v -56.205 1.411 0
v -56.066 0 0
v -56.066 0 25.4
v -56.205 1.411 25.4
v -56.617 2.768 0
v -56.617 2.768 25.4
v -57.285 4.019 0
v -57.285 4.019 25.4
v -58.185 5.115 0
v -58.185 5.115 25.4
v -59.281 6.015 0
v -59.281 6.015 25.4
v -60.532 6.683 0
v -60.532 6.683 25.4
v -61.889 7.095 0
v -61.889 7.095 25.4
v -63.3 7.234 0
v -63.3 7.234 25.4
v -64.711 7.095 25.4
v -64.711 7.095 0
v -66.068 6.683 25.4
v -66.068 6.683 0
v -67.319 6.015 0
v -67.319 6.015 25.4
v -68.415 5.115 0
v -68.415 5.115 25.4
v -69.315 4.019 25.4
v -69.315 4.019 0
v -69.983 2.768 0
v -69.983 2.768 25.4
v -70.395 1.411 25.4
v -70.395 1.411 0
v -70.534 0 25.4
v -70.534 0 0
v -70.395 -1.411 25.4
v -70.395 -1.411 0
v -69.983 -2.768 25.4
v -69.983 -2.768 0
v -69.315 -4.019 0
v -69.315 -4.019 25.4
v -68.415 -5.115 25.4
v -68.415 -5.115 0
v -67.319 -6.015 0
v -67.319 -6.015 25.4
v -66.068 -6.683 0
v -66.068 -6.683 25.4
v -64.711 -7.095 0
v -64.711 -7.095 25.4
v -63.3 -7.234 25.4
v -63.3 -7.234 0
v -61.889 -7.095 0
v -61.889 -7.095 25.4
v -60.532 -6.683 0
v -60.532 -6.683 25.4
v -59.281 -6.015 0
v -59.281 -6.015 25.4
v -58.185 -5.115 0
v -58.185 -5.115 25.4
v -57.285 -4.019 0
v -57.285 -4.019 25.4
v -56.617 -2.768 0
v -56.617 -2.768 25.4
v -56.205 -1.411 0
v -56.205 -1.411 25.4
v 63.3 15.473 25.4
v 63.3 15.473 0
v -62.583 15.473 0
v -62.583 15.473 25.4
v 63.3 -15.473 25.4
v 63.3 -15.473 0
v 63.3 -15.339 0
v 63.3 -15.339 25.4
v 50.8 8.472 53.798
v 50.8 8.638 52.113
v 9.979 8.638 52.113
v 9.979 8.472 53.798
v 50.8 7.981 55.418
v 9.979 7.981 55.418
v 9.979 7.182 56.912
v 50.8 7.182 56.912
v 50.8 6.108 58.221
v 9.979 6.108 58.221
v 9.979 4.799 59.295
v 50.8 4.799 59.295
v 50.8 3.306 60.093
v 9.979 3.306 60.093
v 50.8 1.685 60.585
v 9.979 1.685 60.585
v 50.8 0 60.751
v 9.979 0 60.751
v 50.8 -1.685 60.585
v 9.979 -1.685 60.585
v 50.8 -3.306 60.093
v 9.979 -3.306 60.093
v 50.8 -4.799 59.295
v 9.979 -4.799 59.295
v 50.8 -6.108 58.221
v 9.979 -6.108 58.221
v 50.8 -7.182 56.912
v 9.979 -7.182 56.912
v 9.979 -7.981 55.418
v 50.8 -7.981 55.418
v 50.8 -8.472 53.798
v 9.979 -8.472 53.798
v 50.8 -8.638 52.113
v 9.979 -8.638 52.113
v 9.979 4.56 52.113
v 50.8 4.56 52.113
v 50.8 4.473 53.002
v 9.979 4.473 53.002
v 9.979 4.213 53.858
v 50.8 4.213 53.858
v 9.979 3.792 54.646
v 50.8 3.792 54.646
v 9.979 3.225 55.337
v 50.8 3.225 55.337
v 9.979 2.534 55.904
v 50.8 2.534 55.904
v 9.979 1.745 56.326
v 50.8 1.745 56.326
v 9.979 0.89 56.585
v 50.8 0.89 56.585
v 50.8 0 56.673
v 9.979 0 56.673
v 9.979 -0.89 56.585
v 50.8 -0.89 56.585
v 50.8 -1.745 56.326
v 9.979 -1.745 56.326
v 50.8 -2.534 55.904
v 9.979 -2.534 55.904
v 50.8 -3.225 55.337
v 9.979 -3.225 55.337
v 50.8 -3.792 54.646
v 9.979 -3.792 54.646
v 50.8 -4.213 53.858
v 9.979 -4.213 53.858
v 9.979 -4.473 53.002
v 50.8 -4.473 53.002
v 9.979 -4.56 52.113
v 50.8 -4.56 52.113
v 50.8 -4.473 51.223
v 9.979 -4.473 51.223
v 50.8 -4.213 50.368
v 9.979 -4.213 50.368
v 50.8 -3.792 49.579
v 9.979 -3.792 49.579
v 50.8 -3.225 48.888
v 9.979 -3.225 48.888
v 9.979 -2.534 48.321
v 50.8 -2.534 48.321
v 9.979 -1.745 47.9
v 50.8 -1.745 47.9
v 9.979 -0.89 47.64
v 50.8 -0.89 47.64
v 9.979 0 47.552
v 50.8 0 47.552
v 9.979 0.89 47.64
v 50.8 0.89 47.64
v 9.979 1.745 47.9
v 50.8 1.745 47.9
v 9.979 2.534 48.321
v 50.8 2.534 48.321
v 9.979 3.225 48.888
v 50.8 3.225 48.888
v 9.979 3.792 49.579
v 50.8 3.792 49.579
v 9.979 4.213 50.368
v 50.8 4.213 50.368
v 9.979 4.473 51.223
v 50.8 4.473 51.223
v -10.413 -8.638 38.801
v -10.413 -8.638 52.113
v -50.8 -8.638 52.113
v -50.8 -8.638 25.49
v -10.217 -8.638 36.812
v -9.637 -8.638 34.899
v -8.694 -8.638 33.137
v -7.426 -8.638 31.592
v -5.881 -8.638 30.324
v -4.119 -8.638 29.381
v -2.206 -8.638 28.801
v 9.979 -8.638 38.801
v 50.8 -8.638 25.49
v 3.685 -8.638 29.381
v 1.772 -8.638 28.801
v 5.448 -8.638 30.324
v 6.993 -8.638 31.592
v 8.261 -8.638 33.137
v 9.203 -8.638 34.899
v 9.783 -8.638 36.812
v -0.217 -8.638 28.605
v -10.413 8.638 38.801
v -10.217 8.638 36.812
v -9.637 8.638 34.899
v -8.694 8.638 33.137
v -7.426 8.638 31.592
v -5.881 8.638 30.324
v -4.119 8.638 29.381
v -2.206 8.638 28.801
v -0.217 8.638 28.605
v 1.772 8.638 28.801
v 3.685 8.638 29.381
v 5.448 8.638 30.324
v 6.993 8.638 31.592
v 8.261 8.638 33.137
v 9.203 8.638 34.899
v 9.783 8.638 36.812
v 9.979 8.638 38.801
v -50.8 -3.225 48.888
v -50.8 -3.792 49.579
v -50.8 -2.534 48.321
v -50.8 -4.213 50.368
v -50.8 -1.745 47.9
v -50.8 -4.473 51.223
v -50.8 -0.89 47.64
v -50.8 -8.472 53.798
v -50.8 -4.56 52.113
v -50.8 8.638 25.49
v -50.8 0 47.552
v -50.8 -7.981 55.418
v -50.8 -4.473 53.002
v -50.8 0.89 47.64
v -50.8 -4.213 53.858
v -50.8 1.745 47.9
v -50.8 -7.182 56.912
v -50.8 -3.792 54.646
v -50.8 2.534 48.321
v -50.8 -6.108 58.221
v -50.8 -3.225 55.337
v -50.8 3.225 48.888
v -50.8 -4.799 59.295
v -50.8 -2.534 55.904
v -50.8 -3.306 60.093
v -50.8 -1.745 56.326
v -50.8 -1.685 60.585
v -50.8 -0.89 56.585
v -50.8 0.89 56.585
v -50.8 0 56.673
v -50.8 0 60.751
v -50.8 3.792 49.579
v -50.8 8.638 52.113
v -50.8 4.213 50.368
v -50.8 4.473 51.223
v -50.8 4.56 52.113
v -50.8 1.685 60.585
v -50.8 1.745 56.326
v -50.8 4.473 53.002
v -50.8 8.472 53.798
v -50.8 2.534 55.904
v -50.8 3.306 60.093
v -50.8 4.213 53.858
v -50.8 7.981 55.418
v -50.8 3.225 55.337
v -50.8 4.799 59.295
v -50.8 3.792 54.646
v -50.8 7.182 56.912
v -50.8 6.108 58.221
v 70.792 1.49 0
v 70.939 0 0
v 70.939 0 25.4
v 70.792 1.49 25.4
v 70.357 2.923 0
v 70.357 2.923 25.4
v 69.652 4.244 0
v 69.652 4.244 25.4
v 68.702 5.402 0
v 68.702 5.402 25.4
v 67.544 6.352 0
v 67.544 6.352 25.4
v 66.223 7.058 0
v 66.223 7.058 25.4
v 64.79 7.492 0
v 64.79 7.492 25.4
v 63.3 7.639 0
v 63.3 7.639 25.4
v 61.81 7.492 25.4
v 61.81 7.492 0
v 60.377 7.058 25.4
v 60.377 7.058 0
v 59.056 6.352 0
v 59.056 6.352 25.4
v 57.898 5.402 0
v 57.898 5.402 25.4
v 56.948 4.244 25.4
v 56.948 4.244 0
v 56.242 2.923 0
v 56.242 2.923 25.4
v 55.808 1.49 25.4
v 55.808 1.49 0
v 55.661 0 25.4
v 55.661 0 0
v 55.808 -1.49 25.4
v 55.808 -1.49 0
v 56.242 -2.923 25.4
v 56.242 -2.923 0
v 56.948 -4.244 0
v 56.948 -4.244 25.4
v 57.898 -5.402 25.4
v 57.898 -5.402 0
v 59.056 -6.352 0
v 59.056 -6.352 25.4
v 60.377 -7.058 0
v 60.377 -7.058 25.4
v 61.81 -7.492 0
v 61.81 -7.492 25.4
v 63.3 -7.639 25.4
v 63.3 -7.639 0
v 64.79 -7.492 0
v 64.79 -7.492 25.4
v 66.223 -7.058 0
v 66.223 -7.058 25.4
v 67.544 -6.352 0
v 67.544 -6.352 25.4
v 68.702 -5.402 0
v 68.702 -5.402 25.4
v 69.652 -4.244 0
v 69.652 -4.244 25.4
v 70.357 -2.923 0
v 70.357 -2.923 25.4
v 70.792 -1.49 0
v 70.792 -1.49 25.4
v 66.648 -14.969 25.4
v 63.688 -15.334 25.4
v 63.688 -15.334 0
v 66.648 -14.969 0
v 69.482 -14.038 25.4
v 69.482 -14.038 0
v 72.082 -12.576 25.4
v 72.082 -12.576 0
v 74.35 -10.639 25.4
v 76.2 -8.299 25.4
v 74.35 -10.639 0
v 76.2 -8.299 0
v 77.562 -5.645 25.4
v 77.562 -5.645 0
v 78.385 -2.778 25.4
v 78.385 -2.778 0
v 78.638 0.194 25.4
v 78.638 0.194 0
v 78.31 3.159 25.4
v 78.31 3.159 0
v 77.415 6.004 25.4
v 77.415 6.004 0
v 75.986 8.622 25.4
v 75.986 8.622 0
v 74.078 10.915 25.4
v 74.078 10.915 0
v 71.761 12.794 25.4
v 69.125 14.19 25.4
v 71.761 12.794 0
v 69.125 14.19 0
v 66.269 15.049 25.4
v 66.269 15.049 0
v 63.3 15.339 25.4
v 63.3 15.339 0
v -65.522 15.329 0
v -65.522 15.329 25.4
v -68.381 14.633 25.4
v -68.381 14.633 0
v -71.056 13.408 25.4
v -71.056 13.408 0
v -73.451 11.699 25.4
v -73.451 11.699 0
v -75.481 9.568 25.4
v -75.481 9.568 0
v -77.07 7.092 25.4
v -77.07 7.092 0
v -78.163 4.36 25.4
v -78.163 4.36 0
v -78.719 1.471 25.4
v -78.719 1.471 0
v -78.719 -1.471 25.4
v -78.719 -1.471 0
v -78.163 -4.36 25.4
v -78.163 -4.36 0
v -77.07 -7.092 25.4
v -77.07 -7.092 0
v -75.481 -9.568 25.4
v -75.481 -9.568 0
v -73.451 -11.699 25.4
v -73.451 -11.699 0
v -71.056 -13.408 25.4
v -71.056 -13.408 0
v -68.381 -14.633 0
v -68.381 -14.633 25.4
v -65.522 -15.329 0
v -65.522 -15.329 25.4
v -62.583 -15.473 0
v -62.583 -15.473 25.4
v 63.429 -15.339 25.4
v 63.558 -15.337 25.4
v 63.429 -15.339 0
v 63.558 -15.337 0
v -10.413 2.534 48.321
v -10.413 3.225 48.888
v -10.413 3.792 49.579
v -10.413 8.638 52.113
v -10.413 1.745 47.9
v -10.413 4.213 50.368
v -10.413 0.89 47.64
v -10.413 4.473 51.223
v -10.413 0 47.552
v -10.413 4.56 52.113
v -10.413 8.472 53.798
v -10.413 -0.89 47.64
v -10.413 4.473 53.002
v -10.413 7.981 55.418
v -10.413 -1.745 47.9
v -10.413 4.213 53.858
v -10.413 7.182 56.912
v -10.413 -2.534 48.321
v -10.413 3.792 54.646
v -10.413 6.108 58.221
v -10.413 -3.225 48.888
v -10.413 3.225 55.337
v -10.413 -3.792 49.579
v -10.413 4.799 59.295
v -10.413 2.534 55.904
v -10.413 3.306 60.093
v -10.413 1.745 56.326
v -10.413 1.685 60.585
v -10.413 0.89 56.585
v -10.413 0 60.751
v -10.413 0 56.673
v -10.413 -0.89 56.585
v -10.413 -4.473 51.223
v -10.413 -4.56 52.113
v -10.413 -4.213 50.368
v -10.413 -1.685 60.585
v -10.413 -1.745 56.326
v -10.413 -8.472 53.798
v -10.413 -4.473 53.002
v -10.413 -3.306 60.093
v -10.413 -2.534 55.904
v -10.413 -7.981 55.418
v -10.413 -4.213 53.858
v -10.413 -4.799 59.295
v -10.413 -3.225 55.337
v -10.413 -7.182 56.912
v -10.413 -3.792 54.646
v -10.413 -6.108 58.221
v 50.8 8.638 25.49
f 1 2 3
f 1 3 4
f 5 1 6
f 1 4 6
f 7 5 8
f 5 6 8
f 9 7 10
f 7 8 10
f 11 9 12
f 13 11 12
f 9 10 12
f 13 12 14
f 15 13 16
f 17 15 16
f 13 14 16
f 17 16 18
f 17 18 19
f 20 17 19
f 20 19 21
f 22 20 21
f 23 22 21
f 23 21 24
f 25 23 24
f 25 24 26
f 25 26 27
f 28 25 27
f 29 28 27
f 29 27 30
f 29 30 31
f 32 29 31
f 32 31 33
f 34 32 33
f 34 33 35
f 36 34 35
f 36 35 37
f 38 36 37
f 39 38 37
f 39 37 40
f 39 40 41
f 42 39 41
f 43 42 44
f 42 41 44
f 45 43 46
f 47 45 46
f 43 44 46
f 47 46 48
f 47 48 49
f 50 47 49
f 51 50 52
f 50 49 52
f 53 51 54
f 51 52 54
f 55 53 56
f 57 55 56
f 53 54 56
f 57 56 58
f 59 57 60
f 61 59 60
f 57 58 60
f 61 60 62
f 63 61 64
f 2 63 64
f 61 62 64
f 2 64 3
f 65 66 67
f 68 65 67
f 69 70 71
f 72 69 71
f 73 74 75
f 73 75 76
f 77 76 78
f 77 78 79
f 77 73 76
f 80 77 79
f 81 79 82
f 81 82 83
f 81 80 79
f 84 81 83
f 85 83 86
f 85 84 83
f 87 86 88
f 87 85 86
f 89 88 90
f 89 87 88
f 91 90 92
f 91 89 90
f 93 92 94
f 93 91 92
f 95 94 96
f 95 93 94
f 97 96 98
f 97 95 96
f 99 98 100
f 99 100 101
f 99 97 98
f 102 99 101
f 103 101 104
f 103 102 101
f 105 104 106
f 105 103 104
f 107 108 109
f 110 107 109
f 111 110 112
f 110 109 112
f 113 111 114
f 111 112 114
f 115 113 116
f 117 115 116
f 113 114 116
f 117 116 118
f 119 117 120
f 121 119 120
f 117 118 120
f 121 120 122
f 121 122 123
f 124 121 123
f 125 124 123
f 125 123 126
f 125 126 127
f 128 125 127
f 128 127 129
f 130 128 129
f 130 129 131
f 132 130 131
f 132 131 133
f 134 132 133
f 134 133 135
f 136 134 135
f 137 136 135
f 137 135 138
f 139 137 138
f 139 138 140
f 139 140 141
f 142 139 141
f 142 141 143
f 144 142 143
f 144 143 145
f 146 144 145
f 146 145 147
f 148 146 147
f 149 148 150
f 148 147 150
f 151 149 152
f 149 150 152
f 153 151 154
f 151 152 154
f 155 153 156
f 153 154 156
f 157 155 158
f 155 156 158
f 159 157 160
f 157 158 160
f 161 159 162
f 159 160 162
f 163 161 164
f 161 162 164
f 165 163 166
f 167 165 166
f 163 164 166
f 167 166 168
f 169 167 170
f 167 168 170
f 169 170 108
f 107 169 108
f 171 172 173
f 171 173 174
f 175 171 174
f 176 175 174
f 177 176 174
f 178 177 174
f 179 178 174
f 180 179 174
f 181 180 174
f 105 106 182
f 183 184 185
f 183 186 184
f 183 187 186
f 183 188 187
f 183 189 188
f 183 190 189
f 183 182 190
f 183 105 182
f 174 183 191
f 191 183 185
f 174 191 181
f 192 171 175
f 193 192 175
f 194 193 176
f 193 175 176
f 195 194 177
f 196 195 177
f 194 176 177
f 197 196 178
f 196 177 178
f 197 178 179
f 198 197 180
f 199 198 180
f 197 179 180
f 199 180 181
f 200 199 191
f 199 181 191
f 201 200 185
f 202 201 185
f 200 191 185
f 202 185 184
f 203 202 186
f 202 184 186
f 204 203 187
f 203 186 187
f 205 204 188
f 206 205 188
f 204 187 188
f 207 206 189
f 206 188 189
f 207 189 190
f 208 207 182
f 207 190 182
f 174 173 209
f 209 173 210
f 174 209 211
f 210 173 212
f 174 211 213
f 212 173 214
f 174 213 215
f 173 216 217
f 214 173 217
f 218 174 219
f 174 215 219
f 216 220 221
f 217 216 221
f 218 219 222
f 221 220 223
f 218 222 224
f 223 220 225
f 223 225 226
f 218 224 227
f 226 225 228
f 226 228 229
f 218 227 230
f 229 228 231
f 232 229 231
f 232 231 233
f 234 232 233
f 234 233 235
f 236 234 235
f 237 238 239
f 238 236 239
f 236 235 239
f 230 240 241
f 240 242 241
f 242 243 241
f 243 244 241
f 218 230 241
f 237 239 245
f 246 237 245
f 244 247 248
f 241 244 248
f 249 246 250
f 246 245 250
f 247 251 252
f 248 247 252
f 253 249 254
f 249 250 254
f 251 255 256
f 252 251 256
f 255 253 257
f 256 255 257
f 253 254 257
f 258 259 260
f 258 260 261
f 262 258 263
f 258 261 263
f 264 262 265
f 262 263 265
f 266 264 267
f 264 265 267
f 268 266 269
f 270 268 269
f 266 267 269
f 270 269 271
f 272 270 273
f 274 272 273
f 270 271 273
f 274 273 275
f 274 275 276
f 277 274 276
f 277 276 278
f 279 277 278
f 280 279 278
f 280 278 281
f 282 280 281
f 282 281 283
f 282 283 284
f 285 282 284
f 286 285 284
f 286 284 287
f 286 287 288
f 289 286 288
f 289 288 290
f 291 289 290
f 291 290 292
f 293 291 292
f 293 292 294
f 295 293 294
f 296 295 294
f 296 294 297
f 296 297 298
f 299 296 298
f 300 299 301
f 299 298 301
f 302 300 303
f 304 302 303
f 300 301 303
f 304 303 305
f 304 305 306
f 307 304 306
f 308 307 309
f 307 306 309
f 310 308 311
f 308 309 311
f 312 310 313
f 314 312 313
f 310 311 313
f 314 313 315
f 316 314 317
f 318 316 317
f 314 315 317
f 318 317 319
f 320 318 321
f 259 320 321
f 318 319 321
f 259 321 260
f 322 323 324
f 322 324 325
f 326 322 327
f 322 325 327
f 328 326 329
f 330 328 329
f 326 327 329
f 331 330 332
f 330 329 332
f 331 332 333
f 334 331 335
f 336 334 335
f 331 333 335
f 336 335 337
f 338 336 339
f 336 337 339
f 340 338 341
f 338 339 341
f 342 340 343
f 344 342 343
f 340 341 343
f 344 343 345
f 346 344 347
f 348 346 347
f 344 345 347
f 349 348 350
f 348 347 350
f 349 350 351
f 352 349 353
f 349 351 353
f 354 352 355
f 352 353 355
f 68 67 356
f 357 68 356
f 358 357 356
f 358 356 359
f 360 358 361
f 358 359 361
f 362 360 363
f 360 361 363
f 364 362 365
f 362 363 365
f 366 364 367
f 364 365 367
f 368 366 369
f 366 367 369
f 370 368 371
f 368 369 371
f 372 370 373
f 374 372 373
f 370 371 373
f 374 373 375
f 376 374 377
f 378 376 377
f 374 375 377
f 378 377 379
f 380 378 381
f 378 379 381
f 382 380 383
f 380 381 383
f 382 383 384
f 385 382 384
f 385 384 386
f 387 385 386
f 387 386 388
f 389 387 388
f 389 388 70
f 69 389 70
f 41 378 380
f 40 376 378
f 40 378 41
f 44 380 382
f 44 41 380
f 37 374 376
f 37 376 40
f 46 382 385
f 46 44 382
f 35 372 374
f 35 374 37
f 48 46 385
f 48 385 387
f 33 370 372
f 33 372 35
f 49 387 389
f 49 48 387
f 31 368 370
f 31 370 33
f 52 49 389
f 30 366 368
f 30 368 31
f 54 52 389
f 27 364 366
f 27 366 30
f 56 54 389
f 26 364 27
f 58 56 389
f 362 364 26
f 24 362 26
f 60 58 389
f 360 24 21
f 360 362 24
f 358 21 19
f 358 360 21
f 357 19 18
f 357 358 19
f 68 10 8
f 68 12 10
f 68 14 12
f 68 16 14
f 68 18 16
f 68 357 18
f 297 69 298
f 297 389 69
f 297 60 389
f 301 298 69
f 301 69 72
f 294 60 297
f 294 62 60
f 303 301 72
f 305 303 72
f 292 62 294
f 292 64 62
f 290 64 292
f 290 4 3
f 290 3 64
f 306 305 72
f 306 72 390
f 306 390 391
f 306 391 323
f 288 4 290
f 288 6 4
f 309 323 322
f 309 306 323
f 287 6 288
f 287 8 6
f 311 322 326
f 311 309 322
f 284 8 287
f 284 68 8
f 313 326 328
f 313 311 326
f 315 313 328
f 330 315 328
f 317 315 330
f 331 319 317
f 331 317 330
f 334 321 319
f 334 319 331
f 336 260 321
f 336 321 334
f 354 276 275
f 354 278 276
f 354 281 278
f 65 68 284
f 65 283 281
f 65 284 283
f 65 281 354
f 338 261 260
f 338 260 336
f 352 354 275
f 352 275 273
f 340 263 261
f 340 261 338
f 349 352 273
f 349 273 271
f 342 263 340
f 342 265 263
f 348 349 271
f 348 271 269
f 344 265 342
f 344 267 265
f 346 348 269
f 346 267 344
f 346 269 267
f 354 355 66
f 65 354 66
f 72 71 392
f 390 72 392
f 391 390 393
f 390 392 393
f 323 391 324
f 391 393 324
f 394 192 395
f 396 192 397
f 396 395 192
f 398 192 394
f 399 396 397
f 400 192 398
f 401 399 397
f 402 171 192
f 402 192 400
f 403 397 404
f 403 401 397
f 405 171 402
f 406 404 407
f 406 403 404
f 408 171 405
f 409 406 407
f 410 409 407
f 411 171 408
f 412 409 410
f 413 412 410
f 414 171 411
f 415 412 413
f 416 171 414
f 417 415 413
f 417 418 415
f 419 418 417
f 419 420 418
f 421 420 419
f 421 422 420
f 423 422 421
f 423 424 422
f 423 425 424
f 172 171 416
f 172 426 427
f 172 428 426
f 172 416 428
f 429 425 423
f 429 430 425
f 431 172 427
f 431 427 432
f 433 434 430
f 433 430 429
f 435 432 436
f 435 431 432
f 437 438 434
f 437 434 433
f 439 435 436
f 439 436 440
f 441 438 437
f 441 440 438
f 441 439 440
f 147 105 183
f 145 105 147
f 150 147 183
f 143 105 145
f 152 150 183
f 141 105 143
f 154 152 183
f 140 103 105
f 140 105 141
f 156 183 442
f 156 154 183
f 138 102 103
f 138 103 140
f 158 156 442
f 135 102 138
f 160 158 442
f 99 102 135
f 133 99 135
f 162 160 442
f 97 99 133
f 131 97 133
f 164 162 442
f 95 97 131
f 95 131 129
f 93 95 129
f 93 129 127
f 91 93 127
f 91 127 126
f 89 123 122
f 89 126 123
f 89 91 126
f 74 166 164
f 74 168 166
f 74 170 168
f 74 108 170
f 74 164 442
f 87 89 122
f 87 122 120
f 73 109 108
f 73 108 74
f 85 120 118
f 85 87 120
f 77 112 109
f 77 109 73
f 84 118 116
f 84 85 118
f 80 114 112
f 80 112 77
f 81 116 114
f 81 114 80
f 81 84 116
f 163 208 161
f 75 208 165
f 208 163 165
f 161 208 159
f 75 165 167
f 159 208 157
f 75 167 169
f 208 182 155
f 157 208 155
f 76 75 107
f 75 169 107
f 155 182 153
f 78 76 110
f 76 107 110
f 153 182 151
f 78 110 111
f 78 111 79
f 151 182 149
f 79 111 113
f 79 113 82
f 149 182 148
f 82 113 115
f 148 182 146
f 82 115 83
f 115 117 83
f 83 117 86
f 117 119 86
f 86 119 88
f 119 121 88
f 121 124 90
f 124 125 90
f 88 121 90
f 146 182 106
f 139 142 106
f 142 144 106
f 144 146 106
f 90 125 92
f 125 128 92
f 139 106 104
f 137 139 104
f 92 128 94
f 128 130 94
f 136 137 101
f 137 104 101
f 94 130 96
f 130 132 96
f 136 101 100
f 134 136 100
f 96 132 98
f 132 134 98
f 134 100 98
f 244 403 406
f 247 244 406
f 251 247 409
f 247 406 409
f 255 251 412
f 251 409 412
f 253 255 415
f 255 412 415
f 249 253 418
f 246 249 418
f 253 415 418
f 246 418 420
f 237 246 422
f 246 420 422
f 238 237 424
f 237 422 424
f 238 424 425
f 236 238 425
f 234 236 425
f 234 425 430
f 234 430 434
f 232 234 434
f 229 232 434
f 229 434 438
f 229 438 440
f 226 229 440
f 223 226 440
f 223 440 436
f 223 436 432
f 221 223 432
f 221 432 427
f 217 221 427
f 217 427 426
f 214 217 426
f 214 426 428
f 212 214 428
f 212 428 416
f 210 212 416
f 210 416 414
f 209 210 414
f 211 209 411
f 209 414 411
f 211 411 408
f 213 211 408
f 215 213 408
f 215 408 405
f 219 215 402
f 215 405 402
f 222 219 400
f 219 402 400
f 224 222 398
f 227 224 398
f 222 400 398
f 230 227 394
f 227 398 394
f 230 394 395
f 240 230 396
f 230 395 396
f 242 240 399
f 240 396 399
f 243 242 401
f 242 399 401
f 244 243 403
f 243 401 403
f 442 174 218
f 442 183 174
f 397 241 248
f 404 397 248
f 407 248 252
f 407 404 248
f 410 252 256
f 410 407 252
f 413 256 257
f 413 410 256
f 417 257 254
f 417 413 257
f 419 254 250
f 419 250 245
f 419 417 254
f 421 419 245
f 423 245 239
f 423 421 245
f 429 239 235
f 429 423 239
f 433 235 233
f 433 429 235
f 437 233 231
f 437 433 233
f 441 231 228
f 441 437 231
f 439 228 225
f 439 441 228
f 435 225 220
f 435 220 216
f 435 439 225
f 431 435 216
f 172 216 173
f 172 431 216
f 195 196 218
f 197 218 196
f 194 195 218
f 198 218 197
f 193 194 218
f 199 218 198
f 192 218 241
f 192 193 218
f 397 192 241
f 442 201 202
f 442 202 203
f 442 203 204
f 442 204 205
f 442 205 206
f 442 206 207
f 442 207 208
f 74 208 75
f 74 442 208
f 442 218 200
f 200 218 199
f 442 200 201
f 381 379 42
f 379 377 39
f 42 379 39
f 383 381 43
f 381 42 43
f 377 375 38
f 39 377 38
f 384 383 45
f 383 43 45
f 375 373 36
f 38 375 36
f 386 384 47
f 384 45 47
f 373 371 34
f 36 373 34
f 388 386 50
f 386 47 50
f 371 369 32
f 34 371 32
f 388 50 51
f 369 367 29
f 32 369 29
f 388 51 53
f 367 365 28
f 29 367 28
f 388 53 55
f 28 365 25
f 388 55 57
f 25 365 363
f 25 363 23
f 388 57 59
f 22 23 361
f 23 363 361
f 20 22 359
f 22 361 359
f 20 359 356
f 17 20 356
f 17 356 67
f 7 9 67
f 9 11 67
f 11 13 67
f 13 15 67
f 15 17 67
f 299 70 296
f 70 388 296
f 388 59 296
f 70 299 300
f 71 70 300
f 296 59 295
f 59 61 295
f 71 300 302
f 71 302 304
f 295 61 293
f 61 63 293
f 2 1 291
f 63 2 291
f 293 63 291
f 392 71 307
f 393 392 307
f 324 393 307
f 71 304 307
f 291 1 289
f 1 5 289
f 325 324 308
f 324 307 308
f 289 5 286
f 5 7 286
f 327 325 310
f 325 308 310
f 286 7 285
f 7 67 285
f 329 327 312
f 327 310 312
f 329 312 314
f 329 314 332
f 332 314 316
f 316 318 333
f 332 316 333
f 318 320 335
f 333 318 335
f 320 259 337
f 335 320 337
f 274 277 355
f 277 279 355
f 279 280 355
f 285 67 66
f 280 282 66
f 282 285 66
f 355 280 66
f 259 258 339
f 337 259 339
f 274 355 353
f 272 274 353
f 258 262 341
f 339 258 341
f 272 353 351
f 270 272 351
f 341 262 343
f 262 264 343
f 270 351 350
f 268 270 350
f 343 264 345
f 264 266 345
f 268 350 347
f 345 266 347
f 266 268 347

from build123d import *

# Parameters (mm, degrees)
F1_DEPTH  = 25.4
F3_DEPTH  = 50.8
F4_R      = 4.560216
F5_DEPTH  = 129.59043
F6_R      = 7.233816
F7_DEPTH  = 25.401
F8_R      = 7.639028
F9_DEPTH  = 25.401
F10_W     = 20.391929
F10_H     = 22.091255
F11_DEPTH = 24.128729


with BuildPart() as f1:
    # F0 (on Top) → F1 (new body)
    with BuildSketch(Plane.XY):
        with BuildLine():
            Line((-63.29995, -15.472882), (-63.29995, 15.472882))
            Line((-63.29995, 15.472882), (-63.184723, 15.472882))
            Line((-63.184723, 15.472882), (-62.583075, 15.472882))
            ThreePointArc((-62.583075, 15.472882), (-78.78943, 0), (-62.583075, -15.472882))
            Line((-62.583075, -15.472882), (-63.29995, -15.472882))
        make_face()
        Polygon((-63.184723, 15.472882), (-63.29995, 15.472882), (-63.29995, -15.472882), (-62.583075, -15.472882), (63.29995, -15.472882), (63.29995, -15.339221), (63.29995, 15.339221), (63.29995, 15.472882), (-62.583075, 15.472882), align=None)
        with BuildLine():
            ThreePointArc((63.687565, -15.334322), (78.637946, 0.193823), (63.29995, 15.339221))
            Line((63.29995, 15.339221), (63.29995, -15.339221))
            ThreePointArc((63.29995, -15.339221), (63.493773, -15.337996), (63.687565, -15.334322))
        make_face()
    extrude(amount=F1_DEPTH)

    # F6 (on face) → F7 (cut, through all)
    with BuildSketch(Plane.XY.offset(25.4)):
        with Locations((-63.29995, 0)):
            Circle(F6_R)
    extrude(amount=-F7_DEPTH, mode=Mode.SUBTRACT)

    # F8 (on face) → F9 (cut, through all)
    with BuildSketch(Plane.XY.offset(25.4)):
        with Locations((63.29995, 0)):
            Circle(F8_R)
    extrude(amount=-F9_DEPTH, mode=Mode.SUBTRACT)


with BuildPart() as f3:
    # F2 (on Right) → F3 (new body, symmetric)
    with BuildSketch(Plane.YZ):
        with BuildLine():
            Line((-8.638249, 25.489913), (8.638249, 25.489913))
            Line((8.638249, 25.489913), (8.638249, 52.112712))
            ThreePointArc((8.638249, 52.112712), (0, 60.75096), (-8.638249, 52.112712))
            Line((-8.638249, 52.112712), (-8.638249, 25.489913))
        make_face()
    extrude(amount=F3_DEPTH, both=True)

    # F4 (on face) → F5 (cut, through all)
    with BuildSketch(Plane.YZ.offset(50.8)):
        with Locations((0, 52.112712)):
            Circle(F4_R)
    extrude(amount=-F5_DEPTH, mode=Mode.SUBTRACT)

    # F10 (on face) → F11 (cut, through all)
    with BuildSketch(Plane.XZ.offset(8.638249)):
        with Locations((-0.216738, 49.846939)):
            Rectangle(F10_W, F10_H)
        with BuildLine():
            Line((9.979226, 38.801312), (-10.412703, 38.801312))
            ThreePointArc((-10.412703, 38.801312), (-0.216739, 28.605348), (9.979226, 38.801312))
        make_face()
    extrude(amount=-F11_DEPTH, mode=Mode.SUBTRACT)


solid = Compound([f1.part, f3.part])
